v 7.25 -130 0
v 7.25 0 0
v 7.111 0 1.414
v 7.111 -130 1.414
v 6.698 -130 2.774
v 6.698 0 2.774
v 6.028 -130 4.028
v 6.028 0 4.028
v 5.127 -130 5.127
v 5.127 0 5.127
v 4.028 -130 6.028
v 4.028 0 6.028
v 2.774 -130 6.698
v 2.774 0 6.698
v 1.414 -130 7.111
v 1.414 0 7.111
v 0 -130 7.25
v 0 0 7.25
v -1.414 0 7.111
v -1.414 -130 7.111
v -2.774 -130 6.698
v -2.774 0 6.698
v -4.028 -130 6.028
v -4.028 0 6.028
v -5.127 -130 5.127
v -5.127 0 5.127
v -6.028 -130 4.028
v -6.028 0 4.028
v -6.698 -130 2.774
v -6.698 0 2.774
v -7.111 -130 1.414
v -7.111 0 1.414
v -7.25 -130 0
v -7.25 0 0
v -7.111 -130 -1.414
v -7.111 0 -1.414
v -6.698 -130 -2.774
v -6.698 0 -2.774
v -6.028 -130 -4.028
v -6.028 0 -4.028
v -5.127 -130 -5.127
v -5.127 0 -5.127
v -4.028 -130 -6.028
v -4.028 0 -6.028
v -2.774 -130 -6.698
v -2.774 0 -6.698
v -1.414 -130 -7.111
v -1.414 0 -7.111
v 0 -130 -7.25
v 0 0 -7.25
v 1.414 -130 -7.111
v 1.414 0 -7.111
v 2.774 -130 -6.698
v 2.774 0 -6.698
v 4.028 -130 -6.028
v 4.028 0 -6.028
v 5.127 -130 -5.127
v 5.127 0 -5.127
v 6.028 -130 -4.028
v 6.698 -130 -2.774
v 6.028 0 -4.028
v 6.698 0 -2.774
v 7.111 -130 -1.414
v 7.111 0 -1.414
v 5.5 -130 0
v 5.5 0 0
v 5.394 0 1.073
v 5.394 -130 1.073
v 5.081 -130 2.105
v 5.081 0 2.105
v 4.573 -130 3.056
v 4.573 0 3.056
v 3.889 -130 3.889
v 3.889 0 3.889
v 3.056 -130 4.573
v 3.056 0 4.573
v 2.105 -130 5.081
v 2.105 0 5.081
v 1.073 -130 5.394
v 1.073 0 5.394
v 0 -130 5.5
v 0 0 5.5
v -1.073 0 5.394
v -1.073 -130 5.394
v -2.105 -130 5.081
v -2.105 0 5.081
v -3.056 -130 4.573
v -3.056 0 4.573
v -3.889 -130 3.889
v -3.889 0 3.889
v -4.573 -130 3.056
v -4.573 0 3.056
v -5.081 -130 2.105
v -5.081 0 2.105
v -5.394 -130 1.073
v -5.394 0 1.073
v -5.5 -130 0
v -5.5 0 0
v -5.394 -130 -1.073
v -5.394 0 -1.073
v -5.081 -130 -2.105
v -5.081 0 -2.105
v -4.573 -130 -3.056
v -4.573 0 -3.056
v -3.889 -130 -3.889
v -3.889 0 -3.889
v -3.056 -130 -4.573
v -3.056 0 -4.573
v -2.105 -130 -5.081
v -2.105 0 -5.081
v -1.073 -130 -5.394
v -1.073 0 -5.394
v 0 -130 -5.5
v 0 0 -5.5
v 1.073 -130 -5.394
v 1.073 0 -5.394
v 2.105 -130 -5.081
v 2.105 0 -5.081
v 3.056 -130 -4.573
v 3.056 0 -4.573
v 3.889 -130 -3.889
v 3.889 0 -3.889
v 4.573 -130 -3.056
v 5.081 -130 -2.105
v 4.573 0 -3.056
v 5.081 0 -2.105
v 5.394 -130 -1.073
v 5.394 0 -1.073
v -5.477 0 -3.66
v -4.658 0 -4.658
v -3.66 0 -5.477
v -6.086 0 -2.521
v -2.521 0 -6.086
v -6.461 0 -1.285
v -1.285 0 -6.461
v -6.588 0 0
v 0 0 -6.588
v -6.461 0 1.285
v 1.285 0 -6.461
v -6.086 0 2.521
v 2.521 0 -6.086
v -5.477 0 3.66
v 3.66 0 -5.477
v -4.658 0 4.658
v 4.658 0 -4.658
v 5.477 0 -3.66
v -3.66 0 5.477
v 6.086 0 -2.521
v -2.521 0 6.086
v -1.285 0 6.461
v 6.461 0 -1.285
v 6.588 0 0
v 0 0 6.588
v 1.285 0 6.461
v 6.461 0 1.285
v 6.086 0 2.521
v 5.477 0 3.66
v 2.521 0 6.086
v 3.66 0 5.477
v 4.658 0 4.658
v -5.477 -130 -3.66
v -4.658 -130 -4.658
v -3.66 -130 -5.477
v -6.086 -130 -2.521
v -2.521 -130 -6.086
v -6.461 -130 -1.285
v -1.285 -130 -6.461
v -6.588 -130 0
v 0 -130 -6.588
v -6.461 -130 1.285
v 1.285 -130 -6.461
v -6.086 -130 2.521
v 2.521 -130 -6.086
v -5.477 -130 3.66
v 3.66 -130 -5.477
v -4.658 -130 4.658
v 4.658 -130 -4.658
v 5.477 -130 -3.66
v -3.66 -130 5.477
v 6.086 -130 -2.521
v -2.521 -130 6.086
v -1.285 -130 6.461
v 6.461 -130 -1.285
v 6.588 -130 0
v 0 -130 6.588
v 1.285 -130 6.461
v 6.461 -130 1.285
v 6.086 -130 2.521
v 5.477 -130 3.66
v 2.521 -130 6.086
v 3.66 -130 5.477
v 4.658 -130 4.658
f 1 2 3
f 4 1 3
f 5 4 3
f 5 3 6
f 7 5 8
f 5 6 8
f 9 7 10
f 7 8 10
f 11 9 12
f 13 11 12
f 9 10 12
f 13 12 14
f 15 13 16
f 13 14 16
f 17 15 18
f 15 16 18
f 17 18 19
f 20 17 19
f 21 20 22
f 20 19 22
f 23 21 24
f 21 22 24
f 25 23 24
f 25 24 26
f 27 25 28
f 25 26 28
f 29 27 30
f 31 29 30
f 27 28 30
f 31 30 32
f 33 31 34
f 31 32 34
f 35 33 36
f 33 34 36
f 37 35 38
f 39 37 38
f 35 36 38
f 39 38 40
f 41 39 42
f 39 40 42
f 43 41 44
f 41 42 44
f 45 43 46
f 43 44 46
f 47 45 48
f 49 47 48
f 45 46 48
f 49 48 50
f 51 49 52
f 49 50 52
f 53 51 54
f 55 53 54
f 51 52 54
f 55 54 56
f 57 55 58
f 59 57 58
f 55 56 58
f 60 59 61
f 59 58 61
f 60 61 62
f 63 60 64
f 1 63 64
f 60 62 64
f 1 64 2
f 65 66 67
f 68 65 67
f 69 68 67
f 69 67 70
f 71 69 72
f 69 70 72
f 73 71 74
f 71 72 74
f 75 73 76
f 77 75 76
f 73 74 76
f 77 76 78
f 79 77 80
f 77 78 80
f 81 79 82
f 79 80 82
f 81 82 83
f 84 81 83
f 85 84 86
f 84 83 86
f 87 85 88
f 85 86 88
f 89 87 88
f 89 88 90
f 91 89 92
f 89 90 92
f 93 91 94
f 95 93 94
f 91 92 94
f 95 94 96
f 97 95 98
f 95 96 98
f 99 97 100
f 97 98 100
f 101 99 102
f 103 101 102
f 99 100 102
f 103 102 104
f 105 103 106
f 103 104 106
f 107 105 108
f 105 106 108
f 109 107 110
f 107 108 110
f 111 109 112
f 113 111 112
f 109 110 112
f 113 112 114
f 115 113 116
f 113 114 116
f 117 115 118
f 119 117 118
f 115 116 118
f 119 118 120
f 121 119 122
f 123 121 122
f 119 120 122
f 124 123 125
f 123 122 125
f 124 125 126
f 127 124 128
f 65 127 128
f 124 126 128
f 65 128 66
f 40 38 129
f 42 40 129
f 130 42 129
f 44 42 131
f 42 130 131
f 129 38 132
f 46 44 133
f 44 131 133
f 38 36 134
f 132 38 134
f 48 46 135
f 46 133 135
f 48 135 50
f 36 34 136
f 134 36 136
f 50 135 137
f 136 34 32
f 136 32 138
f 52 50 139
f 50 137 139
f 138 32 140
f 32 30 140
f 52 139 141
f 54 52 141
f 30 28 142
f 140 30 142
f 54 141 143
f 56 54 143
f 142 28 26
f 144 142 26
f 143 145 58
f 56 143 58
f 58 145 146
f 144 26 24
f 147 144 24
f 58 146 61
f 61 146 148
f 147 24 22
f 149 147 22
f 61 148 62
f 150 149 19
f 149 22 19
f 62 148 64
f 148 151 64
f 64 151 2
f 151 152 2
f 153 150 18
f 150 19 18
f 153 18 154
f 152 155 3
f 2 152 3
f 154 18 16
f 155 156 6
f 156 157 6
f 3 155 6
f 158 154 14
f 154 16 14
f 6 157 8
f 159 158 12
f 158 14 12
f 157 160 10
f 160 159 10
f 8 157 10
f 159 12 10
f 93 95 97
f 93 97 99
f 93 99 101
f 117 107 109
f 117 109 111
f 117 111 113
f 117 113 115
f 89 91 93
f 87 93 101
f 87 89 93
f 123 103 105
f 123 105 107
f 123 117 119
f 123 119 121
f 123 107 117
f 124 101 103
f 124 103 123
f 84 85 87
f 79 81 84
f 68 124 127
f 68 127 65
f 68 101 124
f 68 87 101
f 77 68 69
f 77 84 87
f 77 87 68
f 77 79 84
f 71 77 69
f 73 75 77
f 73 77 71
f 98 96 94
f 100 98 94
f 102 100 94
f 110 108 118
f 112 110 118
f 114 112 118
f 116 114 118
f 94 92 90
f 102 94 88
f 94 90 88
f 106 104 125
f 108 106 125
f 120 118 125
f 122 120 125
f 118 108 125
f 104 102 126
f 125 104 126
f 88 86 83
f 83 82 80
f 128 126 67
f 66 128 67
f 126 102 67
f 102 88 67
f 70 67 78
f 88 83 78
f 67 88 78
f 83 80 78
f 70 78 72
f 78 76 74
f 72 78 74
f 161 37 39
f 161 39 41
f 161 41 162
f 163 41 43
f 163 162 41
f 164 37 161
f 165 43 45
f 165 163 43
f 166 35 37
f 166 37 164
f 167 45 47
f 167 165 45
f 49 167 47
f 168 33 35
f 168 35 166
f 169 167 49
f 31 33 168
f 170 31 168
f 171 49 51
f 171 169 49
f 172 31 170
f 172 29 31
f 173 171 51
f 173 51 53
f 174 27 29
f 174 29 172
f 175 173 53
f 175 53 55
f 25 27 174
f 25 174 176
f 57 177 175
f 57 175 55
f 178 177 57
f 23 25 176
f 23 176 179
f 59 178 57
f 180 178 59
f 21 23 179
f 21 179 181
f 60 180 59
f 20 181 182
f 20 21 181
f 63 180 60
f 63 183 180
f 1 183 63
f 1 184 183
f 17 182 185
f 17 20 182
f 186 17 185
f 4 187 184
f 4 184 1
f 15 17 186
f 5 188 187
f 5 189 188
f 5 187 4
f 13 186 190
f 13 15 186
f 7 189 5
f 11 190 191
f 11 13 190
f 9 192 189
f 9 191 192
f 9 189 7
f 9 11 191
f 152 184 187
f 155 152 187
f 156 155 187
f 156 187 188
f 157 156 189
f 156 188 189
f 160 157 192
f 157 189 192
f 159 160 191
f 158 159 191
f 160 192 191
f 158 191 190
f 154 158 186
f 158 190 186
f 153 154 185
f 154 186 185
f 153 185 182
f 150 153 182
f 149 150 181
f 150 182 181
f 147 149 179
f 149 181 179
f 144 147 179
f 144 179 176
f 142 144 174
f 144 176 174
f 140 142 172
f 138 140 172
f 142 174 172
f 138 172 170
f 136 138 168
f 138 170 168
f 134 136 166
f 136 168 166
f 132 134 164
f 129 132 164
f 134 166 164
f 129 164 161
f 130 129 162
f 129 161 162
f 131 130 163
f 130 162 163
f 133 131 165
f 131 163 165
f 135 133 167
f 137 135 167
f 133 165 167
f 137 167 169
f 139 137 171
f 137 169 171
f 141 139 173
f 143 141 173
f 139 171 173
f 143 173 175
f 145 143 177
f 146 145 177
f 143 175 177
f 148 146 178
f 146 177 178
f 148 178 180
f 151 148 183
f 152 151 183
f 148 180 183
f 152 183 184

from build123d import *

# Parameters (mm, degrees)
F0_R     = 7.25
F1_DEPTH = 130
F2_R     = 6.5875
F3_DEPTH = 130
F4_R     = 5.5
F5_DEPTH = 130
F6_R     = 3.150908
F7_DEPTH = 130


with BuildPart() as f1:
    # F0 (on Front) → F1 (new body)
    with BuildSketch(Plane.XZ):
        Circle(F0_R)
    extrude(amount=F1_DEPTH)

    # F2 (on face) → F3 (cut)
    with BuildSketch(Plane.XZ.offset(130)):
        Circle(F2_R)
    extrude(amount=-F3_DEPTH, mode=Mode.SUBTRACT)


with BuildPart() as f5:
    # F4 (on Front) → F5 (new body)
    with BuildSketch(Plane.XZ):
        Circle(F4_R)
    extrude(amount=F5_DEPTH)

    # F6 (on face) → F7 (join)
    with BuildSketch(Plane.XZ.offset(130)):
        Circle(F6_R)
    extrude(amount=-F7_DEPTH)


solid = Compound([f1.part, f5.part])
